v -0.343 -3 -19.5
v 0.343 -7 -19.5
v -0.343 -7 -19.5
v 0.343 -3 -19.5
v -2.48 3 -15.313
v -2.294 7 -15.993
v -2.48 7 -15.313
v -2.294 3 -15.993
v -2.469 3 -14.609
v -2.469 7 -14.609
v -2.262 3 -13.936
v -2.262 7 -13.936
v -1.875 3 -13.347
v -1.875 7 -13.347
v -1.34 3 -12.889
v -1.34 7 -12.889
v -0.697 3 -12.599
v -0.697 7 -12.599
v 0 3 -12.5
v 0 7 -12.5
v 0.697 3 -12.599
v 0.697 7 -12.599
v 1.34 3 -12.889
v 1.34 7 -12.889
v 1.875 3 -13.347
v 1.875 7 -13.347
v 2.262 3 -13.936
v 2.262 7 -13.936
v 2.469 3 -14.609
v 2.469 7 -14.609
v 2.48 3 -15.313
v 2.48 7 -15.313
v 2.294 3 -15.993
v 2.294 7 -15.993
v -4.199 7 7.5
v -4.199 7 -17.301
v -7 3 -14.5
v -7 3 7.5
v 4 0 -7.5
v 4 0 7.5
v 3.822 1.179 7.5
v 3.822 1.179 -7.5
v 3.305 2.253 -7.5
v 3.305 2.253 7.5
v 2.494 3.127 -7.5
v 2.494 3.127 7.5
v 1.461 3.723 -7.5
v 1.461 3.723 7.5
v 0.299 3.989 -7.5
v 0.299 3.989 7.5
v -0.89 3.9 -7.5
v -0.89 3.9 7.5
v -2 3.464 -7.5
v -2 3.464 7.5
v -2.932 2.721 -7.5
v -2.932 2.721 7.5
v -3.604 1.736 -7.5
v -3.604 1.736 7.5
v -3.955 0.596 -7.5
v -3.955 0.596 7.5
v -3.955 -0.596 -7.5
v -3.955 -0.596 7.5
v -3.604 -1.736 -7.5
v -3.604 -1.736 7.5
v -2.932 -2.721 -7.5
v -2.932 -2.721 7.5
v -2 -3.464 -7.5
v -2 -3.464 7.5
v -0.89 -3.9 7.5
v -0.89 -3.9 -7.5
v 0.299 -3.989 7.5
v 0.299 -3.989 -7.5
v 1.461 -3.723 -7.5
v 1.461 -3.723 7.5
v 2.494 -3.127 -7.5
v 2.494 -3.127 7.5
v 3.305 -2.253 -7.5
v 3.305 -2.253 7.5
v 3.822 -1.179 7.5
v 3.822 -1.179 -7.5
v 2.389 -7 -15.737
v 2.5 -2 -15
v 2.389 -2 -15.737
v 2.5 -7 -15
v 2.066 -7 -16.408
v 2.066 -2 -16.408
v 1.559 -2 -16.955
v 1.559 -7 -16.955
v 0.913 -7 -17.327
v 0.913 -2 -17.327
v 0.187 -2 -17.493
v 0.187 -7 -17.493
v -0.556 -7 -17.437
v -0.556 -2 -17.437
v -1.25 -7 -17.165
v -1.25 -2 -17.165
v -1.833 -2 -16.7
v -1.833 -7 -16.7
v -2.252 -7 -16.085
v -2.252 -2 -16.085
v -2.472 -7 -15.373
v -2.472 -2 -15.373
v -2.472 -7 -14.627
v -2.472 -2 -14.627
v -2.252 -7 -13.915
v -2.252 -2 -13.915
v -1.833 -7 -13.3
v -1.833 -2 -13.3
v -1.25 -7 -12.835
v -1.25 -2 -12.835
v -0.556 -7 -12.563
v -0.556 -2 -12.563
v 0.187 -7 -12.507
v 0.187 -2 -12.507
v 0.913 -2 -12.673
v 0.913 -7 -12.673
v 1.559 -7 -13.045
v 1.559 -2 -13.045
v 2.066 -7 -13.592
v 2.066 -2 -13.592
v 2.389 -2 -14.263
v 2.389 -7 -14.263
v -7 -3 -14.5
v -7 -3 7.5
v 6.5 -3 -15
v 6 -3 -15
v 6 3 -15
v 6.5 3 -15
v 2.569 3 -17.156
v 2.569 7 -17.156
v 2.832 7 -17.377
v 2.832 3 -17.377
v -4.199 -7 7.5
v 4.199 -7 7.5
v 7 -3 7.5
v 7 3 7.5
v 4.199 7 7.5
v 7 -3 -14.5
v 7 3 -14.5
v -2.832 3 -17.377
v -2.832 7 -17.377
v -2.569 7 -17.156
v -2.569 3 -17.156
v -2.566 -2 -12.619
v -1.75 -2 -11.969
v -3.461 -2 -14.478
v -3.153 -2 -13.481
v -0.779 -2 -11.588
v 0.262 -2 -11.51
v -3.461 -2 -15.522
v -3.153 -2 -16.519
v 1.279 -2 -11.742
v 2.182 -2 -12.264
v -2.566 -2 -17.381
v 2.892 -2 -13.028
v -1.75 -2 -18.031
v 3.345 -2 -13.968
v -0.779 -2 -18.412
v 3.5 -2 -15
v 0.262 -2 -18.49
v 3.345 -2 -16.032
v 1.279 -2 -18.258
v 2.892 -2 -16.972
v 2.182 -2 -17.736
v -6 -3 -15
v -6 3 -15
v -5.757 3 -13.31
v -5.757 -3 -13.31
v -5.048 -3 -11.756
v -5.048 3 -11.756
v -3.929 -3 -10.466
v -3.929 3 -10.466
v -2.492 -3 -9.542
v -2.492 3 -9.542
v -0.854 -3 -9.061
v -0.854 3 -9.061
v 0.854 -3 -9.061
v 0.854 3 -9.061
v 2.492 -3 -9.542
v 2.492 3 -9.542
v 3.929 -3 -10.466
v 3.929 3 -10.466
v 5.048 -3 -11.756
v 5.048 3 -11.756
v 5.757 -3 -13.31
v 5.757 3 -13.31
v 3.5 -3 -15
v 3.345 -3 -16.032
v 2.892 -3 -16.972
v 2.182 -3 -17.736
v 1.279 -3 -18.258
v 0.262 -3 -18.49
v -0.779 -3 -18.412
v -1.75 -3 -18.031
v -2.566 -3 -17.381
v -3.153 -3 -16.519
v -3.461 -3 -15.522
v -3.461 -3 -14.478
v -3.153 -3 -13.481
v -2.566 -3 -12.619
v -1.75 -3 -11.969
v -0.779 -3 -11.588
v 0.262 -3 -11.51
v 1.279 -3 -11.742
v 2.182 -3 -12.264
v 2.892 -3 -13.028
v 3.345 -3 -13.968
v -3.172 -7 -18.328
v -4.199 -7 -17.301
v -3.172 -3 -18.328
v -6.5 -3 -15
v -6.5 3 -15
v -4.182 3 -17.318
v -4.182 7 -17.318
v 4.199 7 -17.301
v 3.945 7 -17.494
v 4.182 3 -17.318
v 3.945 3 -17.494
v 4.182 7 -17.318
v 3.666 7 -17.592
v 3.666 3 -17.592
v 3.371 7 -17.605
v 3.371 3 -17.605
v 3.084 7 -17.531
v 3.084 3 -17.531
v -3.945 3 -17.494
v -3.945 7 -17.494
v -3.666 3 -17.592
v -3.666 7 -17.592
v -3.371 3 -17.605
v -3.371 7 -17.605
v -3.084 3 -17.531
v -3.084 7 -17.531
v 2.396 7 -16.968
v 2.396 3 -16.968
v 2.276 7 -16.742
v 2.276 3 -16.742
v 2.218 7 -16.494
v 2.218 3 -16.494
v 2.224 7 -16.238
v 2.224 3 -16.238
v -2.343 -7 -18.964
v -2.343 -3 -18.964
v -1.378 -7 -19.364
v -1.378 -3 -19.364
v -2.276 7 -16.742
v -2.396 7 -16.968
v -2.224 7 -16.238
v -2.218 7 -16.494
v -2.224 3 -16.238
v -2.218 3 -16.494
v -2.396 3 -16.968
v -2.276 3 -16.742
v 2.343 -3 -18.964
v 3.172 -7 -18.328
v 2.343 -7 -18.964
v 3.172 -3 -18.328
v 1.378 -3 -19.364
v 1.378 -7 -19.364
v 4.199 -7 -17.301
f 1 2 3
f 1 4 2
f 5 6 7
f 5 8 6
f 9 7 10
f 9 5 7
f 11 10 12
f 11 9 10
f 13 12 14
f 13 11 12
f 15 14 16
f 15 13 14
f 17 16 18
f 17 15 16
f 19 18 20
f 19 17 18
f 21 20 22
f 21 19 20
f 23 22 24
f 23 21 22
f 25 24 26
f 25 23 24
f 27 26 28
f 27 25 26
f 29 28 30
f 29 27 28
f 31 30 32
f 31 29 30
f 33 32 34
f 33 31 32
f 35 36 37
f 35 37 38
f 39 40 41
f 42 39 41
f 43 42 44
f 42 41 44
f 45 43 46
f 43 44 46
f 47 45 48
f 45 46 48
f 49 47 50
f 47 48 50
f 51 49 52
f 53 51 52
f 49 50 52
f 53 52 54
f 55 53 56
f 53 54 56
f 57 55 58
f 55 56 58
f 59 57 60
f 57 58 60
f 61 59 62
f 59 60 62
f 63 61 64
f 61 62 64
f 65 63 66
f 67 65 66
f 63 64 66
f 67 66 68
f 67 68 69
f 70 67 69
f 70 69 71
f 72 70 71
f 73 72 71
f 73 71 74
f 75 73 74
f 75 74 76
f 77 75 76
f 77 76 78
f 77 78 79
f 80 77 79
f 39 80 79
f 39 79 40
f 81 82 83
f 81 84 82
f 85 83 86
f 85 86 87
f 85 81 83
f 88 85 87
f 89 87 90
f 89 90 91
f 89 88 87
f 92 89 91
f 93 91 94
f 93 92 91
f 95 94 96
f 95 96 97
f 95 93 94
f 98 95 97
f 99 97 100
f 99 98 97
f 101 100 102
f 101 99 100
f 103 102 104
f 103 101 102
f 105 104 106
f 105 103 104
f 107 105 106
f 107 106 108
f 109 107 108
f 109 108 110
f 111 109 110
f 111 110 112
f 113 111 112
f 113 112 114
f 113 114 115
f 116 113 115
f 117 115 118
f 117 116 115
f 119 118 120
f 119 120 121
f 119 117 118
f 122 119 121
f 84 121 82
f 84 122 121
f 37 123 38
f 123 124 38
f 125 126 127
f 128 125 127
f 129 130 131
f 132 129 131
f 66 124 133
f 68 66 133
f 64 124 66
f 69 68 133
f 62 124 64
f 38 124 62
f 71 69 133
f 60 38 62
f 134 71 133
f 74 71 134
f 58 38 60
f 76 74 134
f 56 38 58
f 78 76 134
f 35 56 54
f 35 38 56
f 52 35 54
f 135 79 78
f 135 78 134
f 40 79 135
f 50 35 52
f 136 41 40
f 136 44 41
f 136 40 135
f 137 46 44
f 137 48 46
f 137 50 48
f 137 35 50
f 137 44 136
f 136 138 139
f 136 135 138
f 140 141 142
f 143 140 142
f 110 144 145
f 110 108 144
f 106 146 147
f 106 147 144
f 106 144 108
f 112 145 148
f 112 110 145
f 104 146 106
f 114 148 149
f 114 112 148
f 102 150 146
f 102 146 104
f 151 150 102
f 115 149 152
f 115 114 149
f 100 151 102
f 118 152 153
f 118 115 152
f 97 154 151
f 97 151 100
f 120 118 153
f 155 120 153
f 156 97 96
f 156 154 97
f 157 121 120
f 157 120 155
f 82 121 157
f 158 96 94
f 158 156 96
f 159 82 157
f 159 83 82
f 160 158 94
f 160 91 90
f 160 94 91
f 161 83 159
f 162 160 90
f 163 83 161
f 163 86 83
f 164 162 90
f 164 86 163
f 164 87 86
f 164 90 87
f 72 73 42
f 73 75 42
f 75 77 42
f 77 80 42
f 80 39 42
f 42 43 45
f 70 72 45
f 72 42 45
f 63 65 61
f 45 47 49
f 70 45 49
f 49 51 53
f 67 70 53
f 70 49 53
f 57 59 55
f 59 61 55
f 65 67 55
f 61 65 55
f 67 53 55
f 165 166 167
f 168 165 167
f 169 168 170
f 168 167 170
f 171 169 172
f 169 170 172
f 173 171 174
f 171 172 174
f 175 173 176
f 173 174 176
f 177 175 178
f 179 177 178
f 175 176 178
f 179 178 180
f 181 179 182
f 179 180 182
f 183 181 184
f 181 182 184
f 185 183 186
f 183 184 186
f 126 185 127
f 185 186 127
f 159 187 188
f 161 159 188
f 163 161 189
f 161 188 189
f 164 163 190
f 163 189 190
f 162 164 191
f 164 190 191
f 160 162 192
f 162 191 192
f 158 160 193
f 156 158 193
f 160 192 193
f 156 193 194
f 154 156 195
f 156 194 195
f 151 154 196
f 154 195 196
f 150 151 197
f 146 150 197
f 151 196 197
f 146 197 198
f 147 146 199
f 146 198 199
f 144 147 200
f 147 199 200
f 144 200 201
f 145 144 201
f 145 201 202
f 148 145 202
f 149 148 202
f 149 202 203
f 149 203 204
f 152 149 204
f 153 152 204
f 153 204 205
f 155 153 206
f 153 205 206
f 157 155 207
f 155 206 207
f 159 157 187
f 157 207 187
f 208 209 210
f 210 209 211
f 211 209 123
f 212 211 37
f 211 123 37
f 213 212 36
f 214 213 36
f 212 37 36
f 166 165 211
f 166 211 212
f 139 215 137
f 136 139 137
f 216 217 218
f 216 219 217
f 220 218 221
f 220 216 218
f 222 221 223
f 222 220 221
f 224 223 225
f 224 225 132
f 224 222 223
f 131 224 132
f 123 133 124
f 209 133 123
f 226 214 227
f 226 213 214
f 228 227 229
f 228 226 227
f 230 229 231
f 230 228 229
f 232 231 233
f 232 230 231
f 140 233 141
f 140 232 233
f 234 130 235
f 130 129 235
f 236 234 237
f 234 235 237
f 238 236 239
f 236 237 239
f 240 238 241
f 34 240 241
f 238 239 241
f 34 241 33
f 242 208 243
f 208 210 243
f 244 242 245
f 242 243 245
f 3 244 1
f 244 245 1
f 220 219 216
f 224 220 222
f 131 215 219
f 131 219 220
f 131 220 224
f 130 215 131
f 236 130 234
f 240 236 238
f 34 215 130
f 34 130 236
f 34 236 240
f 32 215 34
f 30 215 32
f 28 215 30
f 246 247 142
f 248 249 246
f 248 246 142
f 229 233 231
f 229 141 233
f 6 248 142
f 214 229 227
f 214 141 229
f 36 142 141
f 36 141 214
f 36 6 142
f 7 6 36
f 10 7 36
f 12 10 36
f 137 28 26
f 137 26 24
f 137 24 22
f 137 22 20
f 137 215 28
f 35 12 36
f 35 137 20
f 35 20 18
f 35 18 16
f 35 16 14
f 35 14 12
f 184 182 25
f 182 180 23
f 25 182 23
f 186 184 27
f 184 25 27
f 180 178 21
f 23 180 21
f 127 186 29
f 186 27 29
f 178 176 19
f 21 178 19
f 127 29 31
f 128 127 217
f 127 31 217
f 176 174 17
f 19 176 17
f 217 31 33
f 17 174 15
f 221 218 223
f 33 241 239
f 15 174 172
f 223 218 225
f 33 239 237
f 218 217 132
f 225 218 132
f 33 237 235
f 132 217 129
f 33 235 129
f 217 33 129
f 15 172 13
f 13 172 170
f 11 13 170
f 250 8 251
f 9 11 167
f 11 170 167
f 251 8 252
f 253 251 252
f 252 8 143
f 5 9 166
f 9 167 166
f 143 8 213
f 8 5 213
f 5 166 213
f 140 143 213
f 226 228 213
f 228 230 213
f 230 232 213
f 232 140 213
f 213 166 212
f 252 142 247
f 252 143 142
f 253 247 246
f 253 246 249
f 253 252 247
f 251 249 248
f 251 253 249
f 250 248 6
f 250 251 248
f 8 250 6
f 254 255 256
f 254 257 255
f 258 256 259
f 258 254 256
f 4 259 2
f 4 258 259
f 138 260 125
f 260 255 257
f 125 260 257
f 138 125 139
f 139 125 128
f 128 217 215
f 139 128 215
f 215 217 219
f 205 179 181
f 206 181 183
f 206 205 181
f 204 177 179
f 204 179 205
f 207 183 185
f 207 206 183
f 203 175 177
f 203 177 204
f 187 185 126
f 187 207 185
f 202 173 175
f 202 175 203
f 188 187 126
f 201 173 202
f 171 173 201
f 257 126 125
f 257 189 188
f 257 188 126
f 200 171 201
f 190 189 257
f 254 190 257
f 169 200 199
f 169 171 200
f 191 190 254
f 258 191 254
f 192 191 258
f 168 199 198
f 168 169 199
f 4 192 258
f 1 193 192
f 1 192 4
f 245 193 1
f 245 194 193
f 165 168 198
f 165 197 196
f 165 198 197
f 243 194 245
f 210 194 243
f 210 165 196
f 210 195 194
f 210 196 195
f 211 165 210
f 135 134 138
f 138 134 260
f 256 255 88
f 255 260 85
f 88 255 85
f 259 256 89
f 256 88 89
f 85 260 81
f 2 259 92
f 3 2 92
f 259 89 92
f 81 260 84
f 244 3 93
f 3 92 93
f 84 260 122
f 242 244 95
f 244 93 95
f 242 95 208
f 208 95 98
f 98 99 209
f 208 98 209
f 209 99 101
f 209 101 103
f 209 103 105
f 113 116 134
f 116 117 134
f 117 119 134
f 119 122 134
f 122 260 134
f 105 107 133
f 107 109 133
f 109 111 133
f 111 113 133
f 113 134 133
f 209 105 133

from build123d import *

# Parameters (mm, degrees)
SKETCH1_W               = 14
SKETCH1_H               = 15
BOSS_EXTRUDE1_DEPTH     = 7
SKETCH3_R               = 4
CUT_EXTRUDE1_DEPTH      = 16
SKETCH4_W               = 14
SKETCH4_H               = 14
BOSS_EXTRUDE2_DEPTH     = 12
SKETCH7_R               = 6
CUT_EXTRUDE7_DEPTH      = 3
SKETCH8_R               = 2.5
CUT_EXTRUDE8_DEPTH      = 11
CUT_EXTRUDE8_DEPTH_BACK = 5
SKETCH9_W               = 4.5
SKETCH9_H               = 6
CUT_EXTRUDE9_DEPTH      = 8
CUT_EXTRUDE9_DEPTH_BACK = 8
CHAMFER1_SIZE           = 5
SKETCH13_R              = 3.5
SKETCH13_R_2            = 2.5
BOSS_EXTRUDE3_DEPTH     = 1
CUT_EXTRUDE10_DEPTH     = 6
CHAMFER2_SIZE           = 4
CHAMFER2_SIZE2          = 2.800830153
CHAMFER2_PART_2_SIZE    = 4
CHAMFER2_PART_2_SIZE2   = 2.800830153
CHAMFER3_SIZE           = 4
CHAMFER3_SIZE2          = 2.800830153
CHAMFER3_PART_2_SIZE    = 4
CHAMFER3_PART_2_SIZE2   = 2.800830153
FILLET1_R               = 1
FILLET2_R               = 4


with BuildPart() as part:
    # Sketch1 → Boss-Extrude1 (new body, symmetric)
    with BuildSketch(Plane(origin=(0, 0, 0), x_dir=(1, 0, 0), z_dir=(0, 1, 0))):
        Rectangle(SKETCH1_W, SKETCH1_H)
    extrude(amount=BOSS_EXTRUDE1_DEPTH, both=True)

    # Sketch3 → Cut-Extrude1 (cut, through all)
    with BuildSketch(Plane.XY.offset(7.5)):
        Circle(SKETCH3_R)
    extrude(amount=-CUT_EXTRUDE1_DEPTH, mode=Mode.SUBTRACT)

    # Sketch4 → Boss-Extrude2 (add)
    with BuildSketch(Plane(origin=(0, 0, -7.5), x_dir=(-1, 0, 0), z_dir=(0, 0, -1))):
        Rectangle(SKETCH4_W, SKETCH4_H)
    extrude(amount=BOSS_EXTRUDE2_DEPTH)

    # Sketch7 → Cut-Extrude7 (cut, symmetric)
    with BuildSketch(Plane(origin=(0, 0, 0), x_dir=(1, 0, 0), z_dir=(0, 1, 0))):
        with Locations((0, 15)):
            Circle(SKETCH7_R)
    extrude(amount=CUT_EXTRUDE7_DEPTH, both=True, mode=Mode.SUBTRACT)

    # Sketch8 → Cut-Extrude8 (cut, two sides)
    with BuildSketch(Plane(origin=(0, -3, 0), x_dir=(1, 0, 0), z_dir=(0, 1, 0))) as cut_extrude8_sk:
        with Locations((0, 15)):
            Circle(SKETCH8_R)
    extrude(amount=CUT_EXTRUDE8_DEPTH, mode=Mode.SUBTRACT)
    extrude(cut_extrude8_sk.sketch, amount=-CUT_EXTRUDE8_DEPTH_BACK, mode=Mode.SUBTRACT)

    # Sketch9 → Cut-Extrude9 (cut, two sides)
    with BuildSketch(Plane(origin=(0, 0, 0), x_dir=(0, 0, -1), z_dir=(1, 0, 0))) as cut_extrude9_sk:
        with Locations((17.25, 0)):
            Rectangle(SKETCH9_W, SKETCH9_H)
    extrude(amount=CUT_EXTRUDE9_DEPTH, mode=Mode.SUBTRACT)
    extrude(cut_extrude9_sk.sketch, amount=-CUT_EXTRUDE9_DEPTH_BACK, mode=Mode.SUBTRACT)

    # Chamfer1
    chamfer1_edges = [part.edges().sort_by_distance(p)[0] for p in [
        (7, -5, -19.5),
        (-7, -5, -19.5),
    ]]
    chamfer(chamfer1_edges, length=CHAMFER1_SIZE)

    # Sketch13 → Boss-Extrude3 (add)
    with BuildSketch(Plane(origin=(0, -3, 0), x_dir=(1, 0, 0), z_dir=(0, 1, 0))):
        with Locations((0, 15)):
            Circle(SKETCH13_R)
        with Locations((0, 15)):
            Circle(SKETCH13_R_2, mode=Mode.SUBTRACT)
    extrude(amount=BOSS_EXTRUDE3_DEPTH)

    # Sketch14 → Cut-Extrude10 (cut)
    with BuildSketch(Plane(origin=(0, 7, 0), x_dir=(1, 0, 0), z_dir=(0, 1, 0))):
        Polygon((0, 15), (11.277541362, 24.462980798), (-11.751290712, 24.860503702), align=None)
    extrude(amount=-CUT_EXTRUDE10_DEPTH, mode=Mode.SUBTRACT)

    # Chamfer2
    chamfer2_edges = [part.edges().sort_by_distance(p)[0] for p in [
        (7, 7, -3.5),
    ]]
    chamfer2_side = [part.faces().sort_by_distance(p)[0] for p in [
        (7, 0, -3.5),
    ]]
    chamfer(chamfer2_edges, length=CHAMFER2_SIZE, length2=CHAMFER2_SIZE2, reference=chamfer2_side[0])

    # Chamfer2 part 2
    chamfer2_part_2_edges = [part.edges().sort_by_distance(p)[0] for p in [
        (-7, 7, -3.5),
    ]]
    chamfer2_part_2_side = [part.faces().sort_by_distance(p)[0] for p in [
        (-7, 0, -3.5),
    ]]
    chamfer(chamfer2_part_2_edges, length=CHAMFER2_PART_2_SIZE, length2=CHAMFER2_PART_2_SIZE2, reference=chamfer2_part_2_side[0])

    # Chamfer3
    chamfer3_edges = [part.edges().sort_by_distance(p)[0] for p in [
        (7, -7, -3.5),
    ]]
    chamfer3_side = [part.faces().sort_by_distance(p)[0] for p in [
        (7, -2, -3.5),
    ]]
    chamfer(chamfer3_edges, length=CHAMFER3_SIZE, length2=CHAMFER3_SIZE2, reference=chamfer3_side[0])

    # Chamfer3 part 2
    chamfer3_part_2_edges = [part.edges().sort_by_distance(p)[0] for p in [
        (-7, -7, -3.5),
    ]]
    chamfer3_part_2_side = [part.faces().sort_by_distance(p)[0] for p in [
        (-7, -2, -3.5),
    ]]
    chamfer(chamfer3_part_2_edges, length=CHAMFER3_PART_2_SIZE, length2=CHAMFER3_PART_2_SIZE2, reference=chamfer3_part_2_side[0])

    # Fillet1
    fillet1_edges = [part.edges().sort_by_distance(p)[0] for p in [
        (-3.534338156, 5, -17.965661844),
        (3.534338156, 5, -17.965661844),
        (1.915111108, 5, -16.606969024),
        (-1.915111108, 5, -16.606969024),
    ]]
    fillet(fillet1_edges, radius=FILLET1_R)

    # Fillet2
    fillet2_edges = [part.edges().sort_by_distance(p)[0] for p in [
        (-2, -5, -19.5),
        (2, -5, -19.5),
    ]]
    fillet(fillet2_edges, radius=FILLET2_R)


solid = part.part
